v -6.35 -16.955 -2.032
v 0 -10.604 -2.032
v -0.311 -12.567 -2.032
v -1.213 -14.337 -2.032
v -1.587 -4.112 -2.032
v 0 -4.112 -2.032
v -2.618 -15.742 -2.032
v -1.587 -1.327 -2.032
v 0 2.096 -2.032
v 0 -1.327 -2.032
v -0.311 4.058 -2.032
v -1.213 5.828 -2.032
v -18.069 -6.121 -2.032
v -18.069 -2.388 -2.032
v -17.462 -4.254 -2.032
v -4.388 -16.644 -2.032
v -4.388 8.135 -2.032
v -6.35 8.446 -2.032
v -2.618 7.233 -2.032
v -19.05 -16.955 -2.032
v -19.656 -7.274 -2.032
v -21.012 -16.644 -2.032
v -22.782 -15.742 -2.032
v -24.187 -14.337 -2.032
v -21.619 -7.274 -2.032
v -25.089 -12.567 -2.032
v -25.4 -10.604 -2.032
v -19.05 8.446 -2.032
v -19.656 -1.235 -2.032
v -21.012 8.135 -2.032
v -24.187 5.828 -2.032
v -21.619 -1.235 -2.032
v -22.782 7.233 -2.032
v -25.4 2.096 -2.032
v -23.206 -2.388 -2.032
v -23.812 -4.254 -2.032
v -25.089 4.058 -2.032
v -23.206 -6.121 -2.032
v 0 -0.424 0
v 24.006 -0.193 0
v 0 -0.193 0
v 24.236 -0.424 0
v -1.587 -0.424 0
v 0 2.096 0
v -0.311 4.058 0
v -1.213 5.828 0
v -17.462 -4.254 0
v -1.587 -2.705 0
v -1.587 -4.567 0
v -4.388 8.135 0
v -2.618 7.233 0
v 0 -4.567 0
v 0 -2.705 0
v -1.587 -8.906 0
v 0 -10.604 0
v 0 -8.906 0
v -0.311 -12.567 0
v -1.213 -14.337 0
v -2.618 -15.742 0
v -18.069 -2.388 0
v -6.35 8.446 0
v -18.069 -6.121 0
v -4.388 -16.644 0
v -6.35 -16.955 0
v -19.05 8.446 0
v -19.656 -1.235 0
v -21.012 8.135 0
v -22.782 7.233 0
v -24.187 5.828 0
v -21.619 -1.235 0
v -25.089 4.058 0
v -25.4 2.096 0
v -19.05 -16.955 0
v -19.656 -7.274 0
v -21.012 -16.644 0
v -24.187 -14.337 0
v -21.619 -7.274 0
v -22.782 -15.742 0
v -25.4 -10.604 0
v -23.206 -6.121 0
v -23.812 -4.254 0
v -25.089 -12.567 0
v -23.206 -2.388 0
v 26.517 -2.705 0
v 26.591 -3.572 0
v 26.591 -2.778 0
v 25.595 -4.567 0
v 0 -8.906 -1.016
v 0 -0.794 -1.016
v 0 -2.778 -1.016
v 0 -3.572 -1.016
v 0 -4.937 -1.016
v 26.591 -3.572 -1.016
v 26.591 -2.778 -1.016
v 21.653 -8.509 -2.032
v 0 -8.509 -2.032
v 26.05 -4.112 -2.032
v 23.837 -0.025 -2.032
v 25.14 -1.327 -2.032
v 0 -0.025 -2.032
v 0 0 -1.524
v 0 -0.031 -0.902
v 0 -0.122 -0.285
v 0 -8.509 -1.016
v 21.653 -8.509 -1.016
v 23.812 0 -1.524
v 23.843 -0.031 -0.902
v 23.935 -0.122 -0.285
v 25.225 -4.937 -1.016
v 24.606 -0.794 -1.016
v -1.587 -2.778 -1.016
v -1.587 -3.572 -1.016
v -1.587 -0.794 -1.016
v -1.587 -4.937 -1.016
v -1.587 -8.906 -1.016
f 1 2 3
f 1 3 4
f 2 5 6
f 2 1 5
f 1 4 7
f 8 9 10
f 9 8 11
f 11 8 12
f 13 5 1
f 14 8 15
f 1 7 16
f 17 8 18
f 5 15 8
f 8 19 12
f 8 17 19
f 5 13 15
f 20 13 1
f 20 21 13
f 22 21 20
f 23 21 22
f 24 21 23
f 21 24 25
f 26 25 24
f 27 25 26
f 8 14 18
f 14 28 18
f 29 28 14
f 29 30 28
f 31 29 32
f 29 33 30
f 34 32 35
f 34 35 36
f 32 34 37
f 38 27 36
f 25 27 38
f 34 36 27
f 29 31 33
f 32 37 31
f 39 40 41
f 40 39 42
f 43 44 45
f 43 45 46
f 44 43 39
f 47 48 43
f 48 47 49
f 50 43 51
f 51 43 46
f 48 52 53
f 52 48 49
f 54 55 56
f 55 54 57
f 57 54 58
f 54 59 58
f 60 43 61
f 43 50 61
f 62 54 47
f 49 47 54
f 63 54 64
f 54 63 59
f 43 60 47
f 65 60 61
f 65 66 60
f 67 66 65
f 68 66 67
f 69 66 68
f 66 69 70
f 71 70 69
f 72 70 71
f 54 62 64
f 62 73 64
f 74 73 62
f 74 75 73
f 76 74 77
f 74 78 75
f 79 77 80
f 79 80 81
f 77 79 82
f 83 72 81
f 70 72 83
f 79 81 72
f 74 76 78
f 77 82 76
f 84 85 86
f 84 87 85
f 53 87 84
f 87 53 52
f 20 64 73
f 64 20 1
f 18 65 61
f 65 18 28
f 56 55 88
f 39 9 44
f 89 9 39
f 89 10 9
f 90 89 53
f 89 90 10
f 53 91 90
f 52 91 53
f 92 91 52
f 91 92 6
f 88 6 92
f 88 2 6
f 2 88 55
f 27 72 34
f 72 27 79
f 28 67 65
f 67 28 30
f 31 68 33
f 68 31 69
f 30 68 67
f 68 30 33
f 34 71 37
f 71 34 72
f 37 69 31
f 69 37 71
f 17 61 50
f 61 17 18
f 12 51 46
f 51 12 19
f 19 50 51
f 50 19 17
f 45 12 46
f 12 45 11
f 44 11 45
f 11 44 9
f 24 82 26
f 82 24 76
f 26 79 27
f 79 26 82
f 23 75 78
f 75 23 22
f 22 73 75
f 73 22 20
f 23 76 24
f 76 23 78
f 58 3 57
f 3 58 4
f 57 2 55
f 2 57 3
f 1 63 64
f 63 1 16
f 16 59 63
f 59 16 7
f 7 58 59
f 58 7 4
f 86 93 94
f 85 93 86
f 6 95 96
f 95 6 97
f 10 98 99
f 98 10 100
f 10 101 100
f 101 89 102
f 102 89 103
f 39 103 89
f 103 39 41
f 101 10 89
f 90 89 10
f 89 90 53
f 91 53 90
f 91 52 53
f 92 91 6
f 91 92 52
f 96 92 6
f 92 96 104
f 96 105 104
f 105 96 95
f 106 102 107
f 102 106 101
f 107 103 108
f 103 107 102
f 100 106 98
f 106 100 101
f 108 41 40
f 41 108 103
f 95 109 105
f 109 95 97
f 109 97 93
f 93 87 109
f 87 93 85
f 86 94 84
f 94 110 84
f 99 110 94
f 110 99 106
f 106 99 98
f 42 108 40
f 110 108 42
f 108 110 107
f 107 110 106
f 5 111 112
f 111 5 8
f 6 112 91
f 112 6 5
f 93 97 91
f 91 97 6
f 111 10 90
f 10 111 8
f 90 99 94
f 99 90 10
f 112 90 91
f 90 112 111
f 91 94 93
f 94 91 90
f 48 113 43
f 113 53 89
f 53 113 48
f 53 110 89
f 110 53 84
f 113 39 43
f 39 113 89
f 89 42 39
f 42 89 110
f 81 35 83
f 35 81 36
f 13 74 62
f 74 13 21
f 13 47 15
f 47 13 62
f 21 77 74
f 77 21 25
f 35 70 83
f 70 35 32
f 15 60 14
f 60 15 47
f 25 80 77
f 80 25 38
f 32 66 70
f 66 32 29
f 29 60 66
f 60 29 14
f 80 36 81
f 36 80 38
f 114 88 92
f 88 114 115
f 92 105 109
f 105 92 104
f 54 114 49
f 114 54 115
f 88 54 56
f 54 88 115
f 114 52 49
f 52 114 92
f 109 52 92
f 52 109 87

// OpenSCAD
// Physical Keygen - by Nirav Patel <http://eclecti.cc>
//
// Generate a duplicate of a Schlage SC1 key by editing the last line of the file
// and entering in the key code of the lock.  If you don't know the key code,
// you can measure the key and compare the numbers at:
// http://web.archive.org/web/20050217020917fw_/http://dlaco.com/spacing/tips.htm
//
// This work is licensed under a Creative Commons Attribution 3.0 Unported License.

// Since the keys and locks I have were all designed in imperial units, the
// constants in this file will be defined in inches.  The mm function
// allows us to retain the proper size for exporting a metric STL.
function mm(i) = i*25.4;

module rounded(size, r) {
    union() {
        translate([r, 0, 0]) cube([size[0]-2*r, size[1], size[2]]);
        translate([0, r, 0]) cube([size[0], size[1]-2*r, size[2]]);
        translate([r, r, 0]) cylinder(h=size[2], r=r);
        translate([size[0]-r, r, 0]) cylinder(h=size[2], r=r);
        translate([r, size[1]-r, 0]) cylinder(h=size[2], r=r);
        translate([size[0]-r, size[1]-r, 0]) cylinder(h=size[2], r=r);
    }
}

module bit(bitw) {
    //bitw = 256
    w = mm(1/4);
    difference() {
        translate([-w/2, 0, 0]) cube([w, mm(1), w]);
        translate([-mm(7/bitw), 0, 0]) rotate([0, 0, 135]) cube([w, w, w]);
        translate([mm(7/bitw), 0, 0]) rotate([0, 0, -45]) cube([w, w, w]);
    }
}

// Schlage SC1 5 pin key.  The measurements are mostly guesses based on reverse
// engineering some keys I have and some publicly available information.
module SC1(switch,bits) {

    usebitting = (switch == "code");
    makebump = (switch == "bump");

 
    // You may need to adjust these to fit your specific printer settings
    thickness = mm(0.080);
    length = mm(17/16);
    width = mm(.335);
    
    shoulder = mm(.231);
    pin_spacing = mm(.156);
    depth_inc = mm(.015);


    
    // A fudge factor.  Printing with your average RepRap, the bottom layer is
    // going to be squeezed larger than you want. You can make the pins
    // go slighly deeper by a fudge amount to make up for it if you aren't
    // adjusting for it elsewhere like Skeinforge or in your firmware.
    // 0.5mm works well for me.
    fudge = 0.5;
    
    // Handle size
    h_l = mm(1);
    h_w = mm(1);
    h_d = mm(1/16);
    difference() {
        // blade and key handle
        union() {
            translate([-h_l, -h_w/2 + width/2, 0]) rounded([h_l, h_w, thickness], mm(1/4));
            intersection() {
                // cut a little off the tip to avoid going too long
                cube([length - mm(1/64), width, thickness]);
                translate([0, mm(1/4), thickness*3/4]) rotate([0, 90, 0]) cylinder(h=length, r=mm(1/4), $fn=64);
            }
        }
        
        // chamfer the tip
        translate([length, mm(1/8), 0]) {
            rotate([0, 0, 45]) cube([10, 10, thickness]);
            rotate([0, 0, 225]) cube([10, 10, thickness]);
        }
        
        // put in a hole for keychain use
        translate([-h_l + mm(3/16), width/2, 0]) cylinder(h=thickness, r=mm(1/8));
        
        // cut the channels in the key.  designed more for printability than accuracy
        union() {
            translate([-h_d, mm(9/64), thickness/2]) rotate([62, 0, 0]) cube([length + h_d, width, width]);
            translate([-h_d, mm(7/64), thickness/2]) rotate([55, 0, 0]) cube([length + h_d, width, width]);
            translate([-h_d, mm(7/64), thickness/2]) cube([length + h_d, mm(1/32), width]);
        }
        
        translate([-h_d, width - mm(9/64), 0]) cube([length + h_d, width - (width - mm(10/64)), thickness/2]);
        translate([-h_d, width - mm(9/64), thickness/2]) rotate([-110, 0, 0]) cube([length + h_d, width, thickness/2]);
        
        intersection() {
            translate([-h_d, mm(1/32), thickness/2]) rotate([-118, 0, 0]) cube([length + h_d, width, width]);
            translate([-h_d, mm(1/32), thickness/2]) rotate([-110, 0, 0]) cube([length + h_d, width, width]);
        }
        
        // Do the actual bitting
	     if (usebitting) {
            for (b = [0:4]) {
                translate([shoulder + b*pin_spacing, width - bits[b]*depth_inc - fudge, 0]) bit(256);
            }
        }
	     if (makebump) {
            //for (b = [0:5]) {
                translate([shoulder + 0*pin_spacing, width - bits[0]*depth_inc - fudge, 0]) bit(512);
                translate([shoulder + 1*pin_spacing, width - bits[1]*depth_inc - fudge, 0]) bit(512);
                translate([shoulder + 2*pin_spacing, width - bits[2]*depth_inc - fudge, 0]) bit(512);
                translate([shoulder + 3*pin_spacing, width - bits[3]*depth_inc - fudge, 0]) bit(512);
                translate([shoulder + 4*pin_spacing, width - bits[4]*depth_inc - fudge, 0]) bit(512);
                translate([shoulder + 5*pin_spacing, width - bits[4]*depth_inc - fudge, 0]) bit(512);
            //}
        }
    }
}

 

rotate([180, 0, 0]) SC1("blank",[0,0,0,0,0]);
